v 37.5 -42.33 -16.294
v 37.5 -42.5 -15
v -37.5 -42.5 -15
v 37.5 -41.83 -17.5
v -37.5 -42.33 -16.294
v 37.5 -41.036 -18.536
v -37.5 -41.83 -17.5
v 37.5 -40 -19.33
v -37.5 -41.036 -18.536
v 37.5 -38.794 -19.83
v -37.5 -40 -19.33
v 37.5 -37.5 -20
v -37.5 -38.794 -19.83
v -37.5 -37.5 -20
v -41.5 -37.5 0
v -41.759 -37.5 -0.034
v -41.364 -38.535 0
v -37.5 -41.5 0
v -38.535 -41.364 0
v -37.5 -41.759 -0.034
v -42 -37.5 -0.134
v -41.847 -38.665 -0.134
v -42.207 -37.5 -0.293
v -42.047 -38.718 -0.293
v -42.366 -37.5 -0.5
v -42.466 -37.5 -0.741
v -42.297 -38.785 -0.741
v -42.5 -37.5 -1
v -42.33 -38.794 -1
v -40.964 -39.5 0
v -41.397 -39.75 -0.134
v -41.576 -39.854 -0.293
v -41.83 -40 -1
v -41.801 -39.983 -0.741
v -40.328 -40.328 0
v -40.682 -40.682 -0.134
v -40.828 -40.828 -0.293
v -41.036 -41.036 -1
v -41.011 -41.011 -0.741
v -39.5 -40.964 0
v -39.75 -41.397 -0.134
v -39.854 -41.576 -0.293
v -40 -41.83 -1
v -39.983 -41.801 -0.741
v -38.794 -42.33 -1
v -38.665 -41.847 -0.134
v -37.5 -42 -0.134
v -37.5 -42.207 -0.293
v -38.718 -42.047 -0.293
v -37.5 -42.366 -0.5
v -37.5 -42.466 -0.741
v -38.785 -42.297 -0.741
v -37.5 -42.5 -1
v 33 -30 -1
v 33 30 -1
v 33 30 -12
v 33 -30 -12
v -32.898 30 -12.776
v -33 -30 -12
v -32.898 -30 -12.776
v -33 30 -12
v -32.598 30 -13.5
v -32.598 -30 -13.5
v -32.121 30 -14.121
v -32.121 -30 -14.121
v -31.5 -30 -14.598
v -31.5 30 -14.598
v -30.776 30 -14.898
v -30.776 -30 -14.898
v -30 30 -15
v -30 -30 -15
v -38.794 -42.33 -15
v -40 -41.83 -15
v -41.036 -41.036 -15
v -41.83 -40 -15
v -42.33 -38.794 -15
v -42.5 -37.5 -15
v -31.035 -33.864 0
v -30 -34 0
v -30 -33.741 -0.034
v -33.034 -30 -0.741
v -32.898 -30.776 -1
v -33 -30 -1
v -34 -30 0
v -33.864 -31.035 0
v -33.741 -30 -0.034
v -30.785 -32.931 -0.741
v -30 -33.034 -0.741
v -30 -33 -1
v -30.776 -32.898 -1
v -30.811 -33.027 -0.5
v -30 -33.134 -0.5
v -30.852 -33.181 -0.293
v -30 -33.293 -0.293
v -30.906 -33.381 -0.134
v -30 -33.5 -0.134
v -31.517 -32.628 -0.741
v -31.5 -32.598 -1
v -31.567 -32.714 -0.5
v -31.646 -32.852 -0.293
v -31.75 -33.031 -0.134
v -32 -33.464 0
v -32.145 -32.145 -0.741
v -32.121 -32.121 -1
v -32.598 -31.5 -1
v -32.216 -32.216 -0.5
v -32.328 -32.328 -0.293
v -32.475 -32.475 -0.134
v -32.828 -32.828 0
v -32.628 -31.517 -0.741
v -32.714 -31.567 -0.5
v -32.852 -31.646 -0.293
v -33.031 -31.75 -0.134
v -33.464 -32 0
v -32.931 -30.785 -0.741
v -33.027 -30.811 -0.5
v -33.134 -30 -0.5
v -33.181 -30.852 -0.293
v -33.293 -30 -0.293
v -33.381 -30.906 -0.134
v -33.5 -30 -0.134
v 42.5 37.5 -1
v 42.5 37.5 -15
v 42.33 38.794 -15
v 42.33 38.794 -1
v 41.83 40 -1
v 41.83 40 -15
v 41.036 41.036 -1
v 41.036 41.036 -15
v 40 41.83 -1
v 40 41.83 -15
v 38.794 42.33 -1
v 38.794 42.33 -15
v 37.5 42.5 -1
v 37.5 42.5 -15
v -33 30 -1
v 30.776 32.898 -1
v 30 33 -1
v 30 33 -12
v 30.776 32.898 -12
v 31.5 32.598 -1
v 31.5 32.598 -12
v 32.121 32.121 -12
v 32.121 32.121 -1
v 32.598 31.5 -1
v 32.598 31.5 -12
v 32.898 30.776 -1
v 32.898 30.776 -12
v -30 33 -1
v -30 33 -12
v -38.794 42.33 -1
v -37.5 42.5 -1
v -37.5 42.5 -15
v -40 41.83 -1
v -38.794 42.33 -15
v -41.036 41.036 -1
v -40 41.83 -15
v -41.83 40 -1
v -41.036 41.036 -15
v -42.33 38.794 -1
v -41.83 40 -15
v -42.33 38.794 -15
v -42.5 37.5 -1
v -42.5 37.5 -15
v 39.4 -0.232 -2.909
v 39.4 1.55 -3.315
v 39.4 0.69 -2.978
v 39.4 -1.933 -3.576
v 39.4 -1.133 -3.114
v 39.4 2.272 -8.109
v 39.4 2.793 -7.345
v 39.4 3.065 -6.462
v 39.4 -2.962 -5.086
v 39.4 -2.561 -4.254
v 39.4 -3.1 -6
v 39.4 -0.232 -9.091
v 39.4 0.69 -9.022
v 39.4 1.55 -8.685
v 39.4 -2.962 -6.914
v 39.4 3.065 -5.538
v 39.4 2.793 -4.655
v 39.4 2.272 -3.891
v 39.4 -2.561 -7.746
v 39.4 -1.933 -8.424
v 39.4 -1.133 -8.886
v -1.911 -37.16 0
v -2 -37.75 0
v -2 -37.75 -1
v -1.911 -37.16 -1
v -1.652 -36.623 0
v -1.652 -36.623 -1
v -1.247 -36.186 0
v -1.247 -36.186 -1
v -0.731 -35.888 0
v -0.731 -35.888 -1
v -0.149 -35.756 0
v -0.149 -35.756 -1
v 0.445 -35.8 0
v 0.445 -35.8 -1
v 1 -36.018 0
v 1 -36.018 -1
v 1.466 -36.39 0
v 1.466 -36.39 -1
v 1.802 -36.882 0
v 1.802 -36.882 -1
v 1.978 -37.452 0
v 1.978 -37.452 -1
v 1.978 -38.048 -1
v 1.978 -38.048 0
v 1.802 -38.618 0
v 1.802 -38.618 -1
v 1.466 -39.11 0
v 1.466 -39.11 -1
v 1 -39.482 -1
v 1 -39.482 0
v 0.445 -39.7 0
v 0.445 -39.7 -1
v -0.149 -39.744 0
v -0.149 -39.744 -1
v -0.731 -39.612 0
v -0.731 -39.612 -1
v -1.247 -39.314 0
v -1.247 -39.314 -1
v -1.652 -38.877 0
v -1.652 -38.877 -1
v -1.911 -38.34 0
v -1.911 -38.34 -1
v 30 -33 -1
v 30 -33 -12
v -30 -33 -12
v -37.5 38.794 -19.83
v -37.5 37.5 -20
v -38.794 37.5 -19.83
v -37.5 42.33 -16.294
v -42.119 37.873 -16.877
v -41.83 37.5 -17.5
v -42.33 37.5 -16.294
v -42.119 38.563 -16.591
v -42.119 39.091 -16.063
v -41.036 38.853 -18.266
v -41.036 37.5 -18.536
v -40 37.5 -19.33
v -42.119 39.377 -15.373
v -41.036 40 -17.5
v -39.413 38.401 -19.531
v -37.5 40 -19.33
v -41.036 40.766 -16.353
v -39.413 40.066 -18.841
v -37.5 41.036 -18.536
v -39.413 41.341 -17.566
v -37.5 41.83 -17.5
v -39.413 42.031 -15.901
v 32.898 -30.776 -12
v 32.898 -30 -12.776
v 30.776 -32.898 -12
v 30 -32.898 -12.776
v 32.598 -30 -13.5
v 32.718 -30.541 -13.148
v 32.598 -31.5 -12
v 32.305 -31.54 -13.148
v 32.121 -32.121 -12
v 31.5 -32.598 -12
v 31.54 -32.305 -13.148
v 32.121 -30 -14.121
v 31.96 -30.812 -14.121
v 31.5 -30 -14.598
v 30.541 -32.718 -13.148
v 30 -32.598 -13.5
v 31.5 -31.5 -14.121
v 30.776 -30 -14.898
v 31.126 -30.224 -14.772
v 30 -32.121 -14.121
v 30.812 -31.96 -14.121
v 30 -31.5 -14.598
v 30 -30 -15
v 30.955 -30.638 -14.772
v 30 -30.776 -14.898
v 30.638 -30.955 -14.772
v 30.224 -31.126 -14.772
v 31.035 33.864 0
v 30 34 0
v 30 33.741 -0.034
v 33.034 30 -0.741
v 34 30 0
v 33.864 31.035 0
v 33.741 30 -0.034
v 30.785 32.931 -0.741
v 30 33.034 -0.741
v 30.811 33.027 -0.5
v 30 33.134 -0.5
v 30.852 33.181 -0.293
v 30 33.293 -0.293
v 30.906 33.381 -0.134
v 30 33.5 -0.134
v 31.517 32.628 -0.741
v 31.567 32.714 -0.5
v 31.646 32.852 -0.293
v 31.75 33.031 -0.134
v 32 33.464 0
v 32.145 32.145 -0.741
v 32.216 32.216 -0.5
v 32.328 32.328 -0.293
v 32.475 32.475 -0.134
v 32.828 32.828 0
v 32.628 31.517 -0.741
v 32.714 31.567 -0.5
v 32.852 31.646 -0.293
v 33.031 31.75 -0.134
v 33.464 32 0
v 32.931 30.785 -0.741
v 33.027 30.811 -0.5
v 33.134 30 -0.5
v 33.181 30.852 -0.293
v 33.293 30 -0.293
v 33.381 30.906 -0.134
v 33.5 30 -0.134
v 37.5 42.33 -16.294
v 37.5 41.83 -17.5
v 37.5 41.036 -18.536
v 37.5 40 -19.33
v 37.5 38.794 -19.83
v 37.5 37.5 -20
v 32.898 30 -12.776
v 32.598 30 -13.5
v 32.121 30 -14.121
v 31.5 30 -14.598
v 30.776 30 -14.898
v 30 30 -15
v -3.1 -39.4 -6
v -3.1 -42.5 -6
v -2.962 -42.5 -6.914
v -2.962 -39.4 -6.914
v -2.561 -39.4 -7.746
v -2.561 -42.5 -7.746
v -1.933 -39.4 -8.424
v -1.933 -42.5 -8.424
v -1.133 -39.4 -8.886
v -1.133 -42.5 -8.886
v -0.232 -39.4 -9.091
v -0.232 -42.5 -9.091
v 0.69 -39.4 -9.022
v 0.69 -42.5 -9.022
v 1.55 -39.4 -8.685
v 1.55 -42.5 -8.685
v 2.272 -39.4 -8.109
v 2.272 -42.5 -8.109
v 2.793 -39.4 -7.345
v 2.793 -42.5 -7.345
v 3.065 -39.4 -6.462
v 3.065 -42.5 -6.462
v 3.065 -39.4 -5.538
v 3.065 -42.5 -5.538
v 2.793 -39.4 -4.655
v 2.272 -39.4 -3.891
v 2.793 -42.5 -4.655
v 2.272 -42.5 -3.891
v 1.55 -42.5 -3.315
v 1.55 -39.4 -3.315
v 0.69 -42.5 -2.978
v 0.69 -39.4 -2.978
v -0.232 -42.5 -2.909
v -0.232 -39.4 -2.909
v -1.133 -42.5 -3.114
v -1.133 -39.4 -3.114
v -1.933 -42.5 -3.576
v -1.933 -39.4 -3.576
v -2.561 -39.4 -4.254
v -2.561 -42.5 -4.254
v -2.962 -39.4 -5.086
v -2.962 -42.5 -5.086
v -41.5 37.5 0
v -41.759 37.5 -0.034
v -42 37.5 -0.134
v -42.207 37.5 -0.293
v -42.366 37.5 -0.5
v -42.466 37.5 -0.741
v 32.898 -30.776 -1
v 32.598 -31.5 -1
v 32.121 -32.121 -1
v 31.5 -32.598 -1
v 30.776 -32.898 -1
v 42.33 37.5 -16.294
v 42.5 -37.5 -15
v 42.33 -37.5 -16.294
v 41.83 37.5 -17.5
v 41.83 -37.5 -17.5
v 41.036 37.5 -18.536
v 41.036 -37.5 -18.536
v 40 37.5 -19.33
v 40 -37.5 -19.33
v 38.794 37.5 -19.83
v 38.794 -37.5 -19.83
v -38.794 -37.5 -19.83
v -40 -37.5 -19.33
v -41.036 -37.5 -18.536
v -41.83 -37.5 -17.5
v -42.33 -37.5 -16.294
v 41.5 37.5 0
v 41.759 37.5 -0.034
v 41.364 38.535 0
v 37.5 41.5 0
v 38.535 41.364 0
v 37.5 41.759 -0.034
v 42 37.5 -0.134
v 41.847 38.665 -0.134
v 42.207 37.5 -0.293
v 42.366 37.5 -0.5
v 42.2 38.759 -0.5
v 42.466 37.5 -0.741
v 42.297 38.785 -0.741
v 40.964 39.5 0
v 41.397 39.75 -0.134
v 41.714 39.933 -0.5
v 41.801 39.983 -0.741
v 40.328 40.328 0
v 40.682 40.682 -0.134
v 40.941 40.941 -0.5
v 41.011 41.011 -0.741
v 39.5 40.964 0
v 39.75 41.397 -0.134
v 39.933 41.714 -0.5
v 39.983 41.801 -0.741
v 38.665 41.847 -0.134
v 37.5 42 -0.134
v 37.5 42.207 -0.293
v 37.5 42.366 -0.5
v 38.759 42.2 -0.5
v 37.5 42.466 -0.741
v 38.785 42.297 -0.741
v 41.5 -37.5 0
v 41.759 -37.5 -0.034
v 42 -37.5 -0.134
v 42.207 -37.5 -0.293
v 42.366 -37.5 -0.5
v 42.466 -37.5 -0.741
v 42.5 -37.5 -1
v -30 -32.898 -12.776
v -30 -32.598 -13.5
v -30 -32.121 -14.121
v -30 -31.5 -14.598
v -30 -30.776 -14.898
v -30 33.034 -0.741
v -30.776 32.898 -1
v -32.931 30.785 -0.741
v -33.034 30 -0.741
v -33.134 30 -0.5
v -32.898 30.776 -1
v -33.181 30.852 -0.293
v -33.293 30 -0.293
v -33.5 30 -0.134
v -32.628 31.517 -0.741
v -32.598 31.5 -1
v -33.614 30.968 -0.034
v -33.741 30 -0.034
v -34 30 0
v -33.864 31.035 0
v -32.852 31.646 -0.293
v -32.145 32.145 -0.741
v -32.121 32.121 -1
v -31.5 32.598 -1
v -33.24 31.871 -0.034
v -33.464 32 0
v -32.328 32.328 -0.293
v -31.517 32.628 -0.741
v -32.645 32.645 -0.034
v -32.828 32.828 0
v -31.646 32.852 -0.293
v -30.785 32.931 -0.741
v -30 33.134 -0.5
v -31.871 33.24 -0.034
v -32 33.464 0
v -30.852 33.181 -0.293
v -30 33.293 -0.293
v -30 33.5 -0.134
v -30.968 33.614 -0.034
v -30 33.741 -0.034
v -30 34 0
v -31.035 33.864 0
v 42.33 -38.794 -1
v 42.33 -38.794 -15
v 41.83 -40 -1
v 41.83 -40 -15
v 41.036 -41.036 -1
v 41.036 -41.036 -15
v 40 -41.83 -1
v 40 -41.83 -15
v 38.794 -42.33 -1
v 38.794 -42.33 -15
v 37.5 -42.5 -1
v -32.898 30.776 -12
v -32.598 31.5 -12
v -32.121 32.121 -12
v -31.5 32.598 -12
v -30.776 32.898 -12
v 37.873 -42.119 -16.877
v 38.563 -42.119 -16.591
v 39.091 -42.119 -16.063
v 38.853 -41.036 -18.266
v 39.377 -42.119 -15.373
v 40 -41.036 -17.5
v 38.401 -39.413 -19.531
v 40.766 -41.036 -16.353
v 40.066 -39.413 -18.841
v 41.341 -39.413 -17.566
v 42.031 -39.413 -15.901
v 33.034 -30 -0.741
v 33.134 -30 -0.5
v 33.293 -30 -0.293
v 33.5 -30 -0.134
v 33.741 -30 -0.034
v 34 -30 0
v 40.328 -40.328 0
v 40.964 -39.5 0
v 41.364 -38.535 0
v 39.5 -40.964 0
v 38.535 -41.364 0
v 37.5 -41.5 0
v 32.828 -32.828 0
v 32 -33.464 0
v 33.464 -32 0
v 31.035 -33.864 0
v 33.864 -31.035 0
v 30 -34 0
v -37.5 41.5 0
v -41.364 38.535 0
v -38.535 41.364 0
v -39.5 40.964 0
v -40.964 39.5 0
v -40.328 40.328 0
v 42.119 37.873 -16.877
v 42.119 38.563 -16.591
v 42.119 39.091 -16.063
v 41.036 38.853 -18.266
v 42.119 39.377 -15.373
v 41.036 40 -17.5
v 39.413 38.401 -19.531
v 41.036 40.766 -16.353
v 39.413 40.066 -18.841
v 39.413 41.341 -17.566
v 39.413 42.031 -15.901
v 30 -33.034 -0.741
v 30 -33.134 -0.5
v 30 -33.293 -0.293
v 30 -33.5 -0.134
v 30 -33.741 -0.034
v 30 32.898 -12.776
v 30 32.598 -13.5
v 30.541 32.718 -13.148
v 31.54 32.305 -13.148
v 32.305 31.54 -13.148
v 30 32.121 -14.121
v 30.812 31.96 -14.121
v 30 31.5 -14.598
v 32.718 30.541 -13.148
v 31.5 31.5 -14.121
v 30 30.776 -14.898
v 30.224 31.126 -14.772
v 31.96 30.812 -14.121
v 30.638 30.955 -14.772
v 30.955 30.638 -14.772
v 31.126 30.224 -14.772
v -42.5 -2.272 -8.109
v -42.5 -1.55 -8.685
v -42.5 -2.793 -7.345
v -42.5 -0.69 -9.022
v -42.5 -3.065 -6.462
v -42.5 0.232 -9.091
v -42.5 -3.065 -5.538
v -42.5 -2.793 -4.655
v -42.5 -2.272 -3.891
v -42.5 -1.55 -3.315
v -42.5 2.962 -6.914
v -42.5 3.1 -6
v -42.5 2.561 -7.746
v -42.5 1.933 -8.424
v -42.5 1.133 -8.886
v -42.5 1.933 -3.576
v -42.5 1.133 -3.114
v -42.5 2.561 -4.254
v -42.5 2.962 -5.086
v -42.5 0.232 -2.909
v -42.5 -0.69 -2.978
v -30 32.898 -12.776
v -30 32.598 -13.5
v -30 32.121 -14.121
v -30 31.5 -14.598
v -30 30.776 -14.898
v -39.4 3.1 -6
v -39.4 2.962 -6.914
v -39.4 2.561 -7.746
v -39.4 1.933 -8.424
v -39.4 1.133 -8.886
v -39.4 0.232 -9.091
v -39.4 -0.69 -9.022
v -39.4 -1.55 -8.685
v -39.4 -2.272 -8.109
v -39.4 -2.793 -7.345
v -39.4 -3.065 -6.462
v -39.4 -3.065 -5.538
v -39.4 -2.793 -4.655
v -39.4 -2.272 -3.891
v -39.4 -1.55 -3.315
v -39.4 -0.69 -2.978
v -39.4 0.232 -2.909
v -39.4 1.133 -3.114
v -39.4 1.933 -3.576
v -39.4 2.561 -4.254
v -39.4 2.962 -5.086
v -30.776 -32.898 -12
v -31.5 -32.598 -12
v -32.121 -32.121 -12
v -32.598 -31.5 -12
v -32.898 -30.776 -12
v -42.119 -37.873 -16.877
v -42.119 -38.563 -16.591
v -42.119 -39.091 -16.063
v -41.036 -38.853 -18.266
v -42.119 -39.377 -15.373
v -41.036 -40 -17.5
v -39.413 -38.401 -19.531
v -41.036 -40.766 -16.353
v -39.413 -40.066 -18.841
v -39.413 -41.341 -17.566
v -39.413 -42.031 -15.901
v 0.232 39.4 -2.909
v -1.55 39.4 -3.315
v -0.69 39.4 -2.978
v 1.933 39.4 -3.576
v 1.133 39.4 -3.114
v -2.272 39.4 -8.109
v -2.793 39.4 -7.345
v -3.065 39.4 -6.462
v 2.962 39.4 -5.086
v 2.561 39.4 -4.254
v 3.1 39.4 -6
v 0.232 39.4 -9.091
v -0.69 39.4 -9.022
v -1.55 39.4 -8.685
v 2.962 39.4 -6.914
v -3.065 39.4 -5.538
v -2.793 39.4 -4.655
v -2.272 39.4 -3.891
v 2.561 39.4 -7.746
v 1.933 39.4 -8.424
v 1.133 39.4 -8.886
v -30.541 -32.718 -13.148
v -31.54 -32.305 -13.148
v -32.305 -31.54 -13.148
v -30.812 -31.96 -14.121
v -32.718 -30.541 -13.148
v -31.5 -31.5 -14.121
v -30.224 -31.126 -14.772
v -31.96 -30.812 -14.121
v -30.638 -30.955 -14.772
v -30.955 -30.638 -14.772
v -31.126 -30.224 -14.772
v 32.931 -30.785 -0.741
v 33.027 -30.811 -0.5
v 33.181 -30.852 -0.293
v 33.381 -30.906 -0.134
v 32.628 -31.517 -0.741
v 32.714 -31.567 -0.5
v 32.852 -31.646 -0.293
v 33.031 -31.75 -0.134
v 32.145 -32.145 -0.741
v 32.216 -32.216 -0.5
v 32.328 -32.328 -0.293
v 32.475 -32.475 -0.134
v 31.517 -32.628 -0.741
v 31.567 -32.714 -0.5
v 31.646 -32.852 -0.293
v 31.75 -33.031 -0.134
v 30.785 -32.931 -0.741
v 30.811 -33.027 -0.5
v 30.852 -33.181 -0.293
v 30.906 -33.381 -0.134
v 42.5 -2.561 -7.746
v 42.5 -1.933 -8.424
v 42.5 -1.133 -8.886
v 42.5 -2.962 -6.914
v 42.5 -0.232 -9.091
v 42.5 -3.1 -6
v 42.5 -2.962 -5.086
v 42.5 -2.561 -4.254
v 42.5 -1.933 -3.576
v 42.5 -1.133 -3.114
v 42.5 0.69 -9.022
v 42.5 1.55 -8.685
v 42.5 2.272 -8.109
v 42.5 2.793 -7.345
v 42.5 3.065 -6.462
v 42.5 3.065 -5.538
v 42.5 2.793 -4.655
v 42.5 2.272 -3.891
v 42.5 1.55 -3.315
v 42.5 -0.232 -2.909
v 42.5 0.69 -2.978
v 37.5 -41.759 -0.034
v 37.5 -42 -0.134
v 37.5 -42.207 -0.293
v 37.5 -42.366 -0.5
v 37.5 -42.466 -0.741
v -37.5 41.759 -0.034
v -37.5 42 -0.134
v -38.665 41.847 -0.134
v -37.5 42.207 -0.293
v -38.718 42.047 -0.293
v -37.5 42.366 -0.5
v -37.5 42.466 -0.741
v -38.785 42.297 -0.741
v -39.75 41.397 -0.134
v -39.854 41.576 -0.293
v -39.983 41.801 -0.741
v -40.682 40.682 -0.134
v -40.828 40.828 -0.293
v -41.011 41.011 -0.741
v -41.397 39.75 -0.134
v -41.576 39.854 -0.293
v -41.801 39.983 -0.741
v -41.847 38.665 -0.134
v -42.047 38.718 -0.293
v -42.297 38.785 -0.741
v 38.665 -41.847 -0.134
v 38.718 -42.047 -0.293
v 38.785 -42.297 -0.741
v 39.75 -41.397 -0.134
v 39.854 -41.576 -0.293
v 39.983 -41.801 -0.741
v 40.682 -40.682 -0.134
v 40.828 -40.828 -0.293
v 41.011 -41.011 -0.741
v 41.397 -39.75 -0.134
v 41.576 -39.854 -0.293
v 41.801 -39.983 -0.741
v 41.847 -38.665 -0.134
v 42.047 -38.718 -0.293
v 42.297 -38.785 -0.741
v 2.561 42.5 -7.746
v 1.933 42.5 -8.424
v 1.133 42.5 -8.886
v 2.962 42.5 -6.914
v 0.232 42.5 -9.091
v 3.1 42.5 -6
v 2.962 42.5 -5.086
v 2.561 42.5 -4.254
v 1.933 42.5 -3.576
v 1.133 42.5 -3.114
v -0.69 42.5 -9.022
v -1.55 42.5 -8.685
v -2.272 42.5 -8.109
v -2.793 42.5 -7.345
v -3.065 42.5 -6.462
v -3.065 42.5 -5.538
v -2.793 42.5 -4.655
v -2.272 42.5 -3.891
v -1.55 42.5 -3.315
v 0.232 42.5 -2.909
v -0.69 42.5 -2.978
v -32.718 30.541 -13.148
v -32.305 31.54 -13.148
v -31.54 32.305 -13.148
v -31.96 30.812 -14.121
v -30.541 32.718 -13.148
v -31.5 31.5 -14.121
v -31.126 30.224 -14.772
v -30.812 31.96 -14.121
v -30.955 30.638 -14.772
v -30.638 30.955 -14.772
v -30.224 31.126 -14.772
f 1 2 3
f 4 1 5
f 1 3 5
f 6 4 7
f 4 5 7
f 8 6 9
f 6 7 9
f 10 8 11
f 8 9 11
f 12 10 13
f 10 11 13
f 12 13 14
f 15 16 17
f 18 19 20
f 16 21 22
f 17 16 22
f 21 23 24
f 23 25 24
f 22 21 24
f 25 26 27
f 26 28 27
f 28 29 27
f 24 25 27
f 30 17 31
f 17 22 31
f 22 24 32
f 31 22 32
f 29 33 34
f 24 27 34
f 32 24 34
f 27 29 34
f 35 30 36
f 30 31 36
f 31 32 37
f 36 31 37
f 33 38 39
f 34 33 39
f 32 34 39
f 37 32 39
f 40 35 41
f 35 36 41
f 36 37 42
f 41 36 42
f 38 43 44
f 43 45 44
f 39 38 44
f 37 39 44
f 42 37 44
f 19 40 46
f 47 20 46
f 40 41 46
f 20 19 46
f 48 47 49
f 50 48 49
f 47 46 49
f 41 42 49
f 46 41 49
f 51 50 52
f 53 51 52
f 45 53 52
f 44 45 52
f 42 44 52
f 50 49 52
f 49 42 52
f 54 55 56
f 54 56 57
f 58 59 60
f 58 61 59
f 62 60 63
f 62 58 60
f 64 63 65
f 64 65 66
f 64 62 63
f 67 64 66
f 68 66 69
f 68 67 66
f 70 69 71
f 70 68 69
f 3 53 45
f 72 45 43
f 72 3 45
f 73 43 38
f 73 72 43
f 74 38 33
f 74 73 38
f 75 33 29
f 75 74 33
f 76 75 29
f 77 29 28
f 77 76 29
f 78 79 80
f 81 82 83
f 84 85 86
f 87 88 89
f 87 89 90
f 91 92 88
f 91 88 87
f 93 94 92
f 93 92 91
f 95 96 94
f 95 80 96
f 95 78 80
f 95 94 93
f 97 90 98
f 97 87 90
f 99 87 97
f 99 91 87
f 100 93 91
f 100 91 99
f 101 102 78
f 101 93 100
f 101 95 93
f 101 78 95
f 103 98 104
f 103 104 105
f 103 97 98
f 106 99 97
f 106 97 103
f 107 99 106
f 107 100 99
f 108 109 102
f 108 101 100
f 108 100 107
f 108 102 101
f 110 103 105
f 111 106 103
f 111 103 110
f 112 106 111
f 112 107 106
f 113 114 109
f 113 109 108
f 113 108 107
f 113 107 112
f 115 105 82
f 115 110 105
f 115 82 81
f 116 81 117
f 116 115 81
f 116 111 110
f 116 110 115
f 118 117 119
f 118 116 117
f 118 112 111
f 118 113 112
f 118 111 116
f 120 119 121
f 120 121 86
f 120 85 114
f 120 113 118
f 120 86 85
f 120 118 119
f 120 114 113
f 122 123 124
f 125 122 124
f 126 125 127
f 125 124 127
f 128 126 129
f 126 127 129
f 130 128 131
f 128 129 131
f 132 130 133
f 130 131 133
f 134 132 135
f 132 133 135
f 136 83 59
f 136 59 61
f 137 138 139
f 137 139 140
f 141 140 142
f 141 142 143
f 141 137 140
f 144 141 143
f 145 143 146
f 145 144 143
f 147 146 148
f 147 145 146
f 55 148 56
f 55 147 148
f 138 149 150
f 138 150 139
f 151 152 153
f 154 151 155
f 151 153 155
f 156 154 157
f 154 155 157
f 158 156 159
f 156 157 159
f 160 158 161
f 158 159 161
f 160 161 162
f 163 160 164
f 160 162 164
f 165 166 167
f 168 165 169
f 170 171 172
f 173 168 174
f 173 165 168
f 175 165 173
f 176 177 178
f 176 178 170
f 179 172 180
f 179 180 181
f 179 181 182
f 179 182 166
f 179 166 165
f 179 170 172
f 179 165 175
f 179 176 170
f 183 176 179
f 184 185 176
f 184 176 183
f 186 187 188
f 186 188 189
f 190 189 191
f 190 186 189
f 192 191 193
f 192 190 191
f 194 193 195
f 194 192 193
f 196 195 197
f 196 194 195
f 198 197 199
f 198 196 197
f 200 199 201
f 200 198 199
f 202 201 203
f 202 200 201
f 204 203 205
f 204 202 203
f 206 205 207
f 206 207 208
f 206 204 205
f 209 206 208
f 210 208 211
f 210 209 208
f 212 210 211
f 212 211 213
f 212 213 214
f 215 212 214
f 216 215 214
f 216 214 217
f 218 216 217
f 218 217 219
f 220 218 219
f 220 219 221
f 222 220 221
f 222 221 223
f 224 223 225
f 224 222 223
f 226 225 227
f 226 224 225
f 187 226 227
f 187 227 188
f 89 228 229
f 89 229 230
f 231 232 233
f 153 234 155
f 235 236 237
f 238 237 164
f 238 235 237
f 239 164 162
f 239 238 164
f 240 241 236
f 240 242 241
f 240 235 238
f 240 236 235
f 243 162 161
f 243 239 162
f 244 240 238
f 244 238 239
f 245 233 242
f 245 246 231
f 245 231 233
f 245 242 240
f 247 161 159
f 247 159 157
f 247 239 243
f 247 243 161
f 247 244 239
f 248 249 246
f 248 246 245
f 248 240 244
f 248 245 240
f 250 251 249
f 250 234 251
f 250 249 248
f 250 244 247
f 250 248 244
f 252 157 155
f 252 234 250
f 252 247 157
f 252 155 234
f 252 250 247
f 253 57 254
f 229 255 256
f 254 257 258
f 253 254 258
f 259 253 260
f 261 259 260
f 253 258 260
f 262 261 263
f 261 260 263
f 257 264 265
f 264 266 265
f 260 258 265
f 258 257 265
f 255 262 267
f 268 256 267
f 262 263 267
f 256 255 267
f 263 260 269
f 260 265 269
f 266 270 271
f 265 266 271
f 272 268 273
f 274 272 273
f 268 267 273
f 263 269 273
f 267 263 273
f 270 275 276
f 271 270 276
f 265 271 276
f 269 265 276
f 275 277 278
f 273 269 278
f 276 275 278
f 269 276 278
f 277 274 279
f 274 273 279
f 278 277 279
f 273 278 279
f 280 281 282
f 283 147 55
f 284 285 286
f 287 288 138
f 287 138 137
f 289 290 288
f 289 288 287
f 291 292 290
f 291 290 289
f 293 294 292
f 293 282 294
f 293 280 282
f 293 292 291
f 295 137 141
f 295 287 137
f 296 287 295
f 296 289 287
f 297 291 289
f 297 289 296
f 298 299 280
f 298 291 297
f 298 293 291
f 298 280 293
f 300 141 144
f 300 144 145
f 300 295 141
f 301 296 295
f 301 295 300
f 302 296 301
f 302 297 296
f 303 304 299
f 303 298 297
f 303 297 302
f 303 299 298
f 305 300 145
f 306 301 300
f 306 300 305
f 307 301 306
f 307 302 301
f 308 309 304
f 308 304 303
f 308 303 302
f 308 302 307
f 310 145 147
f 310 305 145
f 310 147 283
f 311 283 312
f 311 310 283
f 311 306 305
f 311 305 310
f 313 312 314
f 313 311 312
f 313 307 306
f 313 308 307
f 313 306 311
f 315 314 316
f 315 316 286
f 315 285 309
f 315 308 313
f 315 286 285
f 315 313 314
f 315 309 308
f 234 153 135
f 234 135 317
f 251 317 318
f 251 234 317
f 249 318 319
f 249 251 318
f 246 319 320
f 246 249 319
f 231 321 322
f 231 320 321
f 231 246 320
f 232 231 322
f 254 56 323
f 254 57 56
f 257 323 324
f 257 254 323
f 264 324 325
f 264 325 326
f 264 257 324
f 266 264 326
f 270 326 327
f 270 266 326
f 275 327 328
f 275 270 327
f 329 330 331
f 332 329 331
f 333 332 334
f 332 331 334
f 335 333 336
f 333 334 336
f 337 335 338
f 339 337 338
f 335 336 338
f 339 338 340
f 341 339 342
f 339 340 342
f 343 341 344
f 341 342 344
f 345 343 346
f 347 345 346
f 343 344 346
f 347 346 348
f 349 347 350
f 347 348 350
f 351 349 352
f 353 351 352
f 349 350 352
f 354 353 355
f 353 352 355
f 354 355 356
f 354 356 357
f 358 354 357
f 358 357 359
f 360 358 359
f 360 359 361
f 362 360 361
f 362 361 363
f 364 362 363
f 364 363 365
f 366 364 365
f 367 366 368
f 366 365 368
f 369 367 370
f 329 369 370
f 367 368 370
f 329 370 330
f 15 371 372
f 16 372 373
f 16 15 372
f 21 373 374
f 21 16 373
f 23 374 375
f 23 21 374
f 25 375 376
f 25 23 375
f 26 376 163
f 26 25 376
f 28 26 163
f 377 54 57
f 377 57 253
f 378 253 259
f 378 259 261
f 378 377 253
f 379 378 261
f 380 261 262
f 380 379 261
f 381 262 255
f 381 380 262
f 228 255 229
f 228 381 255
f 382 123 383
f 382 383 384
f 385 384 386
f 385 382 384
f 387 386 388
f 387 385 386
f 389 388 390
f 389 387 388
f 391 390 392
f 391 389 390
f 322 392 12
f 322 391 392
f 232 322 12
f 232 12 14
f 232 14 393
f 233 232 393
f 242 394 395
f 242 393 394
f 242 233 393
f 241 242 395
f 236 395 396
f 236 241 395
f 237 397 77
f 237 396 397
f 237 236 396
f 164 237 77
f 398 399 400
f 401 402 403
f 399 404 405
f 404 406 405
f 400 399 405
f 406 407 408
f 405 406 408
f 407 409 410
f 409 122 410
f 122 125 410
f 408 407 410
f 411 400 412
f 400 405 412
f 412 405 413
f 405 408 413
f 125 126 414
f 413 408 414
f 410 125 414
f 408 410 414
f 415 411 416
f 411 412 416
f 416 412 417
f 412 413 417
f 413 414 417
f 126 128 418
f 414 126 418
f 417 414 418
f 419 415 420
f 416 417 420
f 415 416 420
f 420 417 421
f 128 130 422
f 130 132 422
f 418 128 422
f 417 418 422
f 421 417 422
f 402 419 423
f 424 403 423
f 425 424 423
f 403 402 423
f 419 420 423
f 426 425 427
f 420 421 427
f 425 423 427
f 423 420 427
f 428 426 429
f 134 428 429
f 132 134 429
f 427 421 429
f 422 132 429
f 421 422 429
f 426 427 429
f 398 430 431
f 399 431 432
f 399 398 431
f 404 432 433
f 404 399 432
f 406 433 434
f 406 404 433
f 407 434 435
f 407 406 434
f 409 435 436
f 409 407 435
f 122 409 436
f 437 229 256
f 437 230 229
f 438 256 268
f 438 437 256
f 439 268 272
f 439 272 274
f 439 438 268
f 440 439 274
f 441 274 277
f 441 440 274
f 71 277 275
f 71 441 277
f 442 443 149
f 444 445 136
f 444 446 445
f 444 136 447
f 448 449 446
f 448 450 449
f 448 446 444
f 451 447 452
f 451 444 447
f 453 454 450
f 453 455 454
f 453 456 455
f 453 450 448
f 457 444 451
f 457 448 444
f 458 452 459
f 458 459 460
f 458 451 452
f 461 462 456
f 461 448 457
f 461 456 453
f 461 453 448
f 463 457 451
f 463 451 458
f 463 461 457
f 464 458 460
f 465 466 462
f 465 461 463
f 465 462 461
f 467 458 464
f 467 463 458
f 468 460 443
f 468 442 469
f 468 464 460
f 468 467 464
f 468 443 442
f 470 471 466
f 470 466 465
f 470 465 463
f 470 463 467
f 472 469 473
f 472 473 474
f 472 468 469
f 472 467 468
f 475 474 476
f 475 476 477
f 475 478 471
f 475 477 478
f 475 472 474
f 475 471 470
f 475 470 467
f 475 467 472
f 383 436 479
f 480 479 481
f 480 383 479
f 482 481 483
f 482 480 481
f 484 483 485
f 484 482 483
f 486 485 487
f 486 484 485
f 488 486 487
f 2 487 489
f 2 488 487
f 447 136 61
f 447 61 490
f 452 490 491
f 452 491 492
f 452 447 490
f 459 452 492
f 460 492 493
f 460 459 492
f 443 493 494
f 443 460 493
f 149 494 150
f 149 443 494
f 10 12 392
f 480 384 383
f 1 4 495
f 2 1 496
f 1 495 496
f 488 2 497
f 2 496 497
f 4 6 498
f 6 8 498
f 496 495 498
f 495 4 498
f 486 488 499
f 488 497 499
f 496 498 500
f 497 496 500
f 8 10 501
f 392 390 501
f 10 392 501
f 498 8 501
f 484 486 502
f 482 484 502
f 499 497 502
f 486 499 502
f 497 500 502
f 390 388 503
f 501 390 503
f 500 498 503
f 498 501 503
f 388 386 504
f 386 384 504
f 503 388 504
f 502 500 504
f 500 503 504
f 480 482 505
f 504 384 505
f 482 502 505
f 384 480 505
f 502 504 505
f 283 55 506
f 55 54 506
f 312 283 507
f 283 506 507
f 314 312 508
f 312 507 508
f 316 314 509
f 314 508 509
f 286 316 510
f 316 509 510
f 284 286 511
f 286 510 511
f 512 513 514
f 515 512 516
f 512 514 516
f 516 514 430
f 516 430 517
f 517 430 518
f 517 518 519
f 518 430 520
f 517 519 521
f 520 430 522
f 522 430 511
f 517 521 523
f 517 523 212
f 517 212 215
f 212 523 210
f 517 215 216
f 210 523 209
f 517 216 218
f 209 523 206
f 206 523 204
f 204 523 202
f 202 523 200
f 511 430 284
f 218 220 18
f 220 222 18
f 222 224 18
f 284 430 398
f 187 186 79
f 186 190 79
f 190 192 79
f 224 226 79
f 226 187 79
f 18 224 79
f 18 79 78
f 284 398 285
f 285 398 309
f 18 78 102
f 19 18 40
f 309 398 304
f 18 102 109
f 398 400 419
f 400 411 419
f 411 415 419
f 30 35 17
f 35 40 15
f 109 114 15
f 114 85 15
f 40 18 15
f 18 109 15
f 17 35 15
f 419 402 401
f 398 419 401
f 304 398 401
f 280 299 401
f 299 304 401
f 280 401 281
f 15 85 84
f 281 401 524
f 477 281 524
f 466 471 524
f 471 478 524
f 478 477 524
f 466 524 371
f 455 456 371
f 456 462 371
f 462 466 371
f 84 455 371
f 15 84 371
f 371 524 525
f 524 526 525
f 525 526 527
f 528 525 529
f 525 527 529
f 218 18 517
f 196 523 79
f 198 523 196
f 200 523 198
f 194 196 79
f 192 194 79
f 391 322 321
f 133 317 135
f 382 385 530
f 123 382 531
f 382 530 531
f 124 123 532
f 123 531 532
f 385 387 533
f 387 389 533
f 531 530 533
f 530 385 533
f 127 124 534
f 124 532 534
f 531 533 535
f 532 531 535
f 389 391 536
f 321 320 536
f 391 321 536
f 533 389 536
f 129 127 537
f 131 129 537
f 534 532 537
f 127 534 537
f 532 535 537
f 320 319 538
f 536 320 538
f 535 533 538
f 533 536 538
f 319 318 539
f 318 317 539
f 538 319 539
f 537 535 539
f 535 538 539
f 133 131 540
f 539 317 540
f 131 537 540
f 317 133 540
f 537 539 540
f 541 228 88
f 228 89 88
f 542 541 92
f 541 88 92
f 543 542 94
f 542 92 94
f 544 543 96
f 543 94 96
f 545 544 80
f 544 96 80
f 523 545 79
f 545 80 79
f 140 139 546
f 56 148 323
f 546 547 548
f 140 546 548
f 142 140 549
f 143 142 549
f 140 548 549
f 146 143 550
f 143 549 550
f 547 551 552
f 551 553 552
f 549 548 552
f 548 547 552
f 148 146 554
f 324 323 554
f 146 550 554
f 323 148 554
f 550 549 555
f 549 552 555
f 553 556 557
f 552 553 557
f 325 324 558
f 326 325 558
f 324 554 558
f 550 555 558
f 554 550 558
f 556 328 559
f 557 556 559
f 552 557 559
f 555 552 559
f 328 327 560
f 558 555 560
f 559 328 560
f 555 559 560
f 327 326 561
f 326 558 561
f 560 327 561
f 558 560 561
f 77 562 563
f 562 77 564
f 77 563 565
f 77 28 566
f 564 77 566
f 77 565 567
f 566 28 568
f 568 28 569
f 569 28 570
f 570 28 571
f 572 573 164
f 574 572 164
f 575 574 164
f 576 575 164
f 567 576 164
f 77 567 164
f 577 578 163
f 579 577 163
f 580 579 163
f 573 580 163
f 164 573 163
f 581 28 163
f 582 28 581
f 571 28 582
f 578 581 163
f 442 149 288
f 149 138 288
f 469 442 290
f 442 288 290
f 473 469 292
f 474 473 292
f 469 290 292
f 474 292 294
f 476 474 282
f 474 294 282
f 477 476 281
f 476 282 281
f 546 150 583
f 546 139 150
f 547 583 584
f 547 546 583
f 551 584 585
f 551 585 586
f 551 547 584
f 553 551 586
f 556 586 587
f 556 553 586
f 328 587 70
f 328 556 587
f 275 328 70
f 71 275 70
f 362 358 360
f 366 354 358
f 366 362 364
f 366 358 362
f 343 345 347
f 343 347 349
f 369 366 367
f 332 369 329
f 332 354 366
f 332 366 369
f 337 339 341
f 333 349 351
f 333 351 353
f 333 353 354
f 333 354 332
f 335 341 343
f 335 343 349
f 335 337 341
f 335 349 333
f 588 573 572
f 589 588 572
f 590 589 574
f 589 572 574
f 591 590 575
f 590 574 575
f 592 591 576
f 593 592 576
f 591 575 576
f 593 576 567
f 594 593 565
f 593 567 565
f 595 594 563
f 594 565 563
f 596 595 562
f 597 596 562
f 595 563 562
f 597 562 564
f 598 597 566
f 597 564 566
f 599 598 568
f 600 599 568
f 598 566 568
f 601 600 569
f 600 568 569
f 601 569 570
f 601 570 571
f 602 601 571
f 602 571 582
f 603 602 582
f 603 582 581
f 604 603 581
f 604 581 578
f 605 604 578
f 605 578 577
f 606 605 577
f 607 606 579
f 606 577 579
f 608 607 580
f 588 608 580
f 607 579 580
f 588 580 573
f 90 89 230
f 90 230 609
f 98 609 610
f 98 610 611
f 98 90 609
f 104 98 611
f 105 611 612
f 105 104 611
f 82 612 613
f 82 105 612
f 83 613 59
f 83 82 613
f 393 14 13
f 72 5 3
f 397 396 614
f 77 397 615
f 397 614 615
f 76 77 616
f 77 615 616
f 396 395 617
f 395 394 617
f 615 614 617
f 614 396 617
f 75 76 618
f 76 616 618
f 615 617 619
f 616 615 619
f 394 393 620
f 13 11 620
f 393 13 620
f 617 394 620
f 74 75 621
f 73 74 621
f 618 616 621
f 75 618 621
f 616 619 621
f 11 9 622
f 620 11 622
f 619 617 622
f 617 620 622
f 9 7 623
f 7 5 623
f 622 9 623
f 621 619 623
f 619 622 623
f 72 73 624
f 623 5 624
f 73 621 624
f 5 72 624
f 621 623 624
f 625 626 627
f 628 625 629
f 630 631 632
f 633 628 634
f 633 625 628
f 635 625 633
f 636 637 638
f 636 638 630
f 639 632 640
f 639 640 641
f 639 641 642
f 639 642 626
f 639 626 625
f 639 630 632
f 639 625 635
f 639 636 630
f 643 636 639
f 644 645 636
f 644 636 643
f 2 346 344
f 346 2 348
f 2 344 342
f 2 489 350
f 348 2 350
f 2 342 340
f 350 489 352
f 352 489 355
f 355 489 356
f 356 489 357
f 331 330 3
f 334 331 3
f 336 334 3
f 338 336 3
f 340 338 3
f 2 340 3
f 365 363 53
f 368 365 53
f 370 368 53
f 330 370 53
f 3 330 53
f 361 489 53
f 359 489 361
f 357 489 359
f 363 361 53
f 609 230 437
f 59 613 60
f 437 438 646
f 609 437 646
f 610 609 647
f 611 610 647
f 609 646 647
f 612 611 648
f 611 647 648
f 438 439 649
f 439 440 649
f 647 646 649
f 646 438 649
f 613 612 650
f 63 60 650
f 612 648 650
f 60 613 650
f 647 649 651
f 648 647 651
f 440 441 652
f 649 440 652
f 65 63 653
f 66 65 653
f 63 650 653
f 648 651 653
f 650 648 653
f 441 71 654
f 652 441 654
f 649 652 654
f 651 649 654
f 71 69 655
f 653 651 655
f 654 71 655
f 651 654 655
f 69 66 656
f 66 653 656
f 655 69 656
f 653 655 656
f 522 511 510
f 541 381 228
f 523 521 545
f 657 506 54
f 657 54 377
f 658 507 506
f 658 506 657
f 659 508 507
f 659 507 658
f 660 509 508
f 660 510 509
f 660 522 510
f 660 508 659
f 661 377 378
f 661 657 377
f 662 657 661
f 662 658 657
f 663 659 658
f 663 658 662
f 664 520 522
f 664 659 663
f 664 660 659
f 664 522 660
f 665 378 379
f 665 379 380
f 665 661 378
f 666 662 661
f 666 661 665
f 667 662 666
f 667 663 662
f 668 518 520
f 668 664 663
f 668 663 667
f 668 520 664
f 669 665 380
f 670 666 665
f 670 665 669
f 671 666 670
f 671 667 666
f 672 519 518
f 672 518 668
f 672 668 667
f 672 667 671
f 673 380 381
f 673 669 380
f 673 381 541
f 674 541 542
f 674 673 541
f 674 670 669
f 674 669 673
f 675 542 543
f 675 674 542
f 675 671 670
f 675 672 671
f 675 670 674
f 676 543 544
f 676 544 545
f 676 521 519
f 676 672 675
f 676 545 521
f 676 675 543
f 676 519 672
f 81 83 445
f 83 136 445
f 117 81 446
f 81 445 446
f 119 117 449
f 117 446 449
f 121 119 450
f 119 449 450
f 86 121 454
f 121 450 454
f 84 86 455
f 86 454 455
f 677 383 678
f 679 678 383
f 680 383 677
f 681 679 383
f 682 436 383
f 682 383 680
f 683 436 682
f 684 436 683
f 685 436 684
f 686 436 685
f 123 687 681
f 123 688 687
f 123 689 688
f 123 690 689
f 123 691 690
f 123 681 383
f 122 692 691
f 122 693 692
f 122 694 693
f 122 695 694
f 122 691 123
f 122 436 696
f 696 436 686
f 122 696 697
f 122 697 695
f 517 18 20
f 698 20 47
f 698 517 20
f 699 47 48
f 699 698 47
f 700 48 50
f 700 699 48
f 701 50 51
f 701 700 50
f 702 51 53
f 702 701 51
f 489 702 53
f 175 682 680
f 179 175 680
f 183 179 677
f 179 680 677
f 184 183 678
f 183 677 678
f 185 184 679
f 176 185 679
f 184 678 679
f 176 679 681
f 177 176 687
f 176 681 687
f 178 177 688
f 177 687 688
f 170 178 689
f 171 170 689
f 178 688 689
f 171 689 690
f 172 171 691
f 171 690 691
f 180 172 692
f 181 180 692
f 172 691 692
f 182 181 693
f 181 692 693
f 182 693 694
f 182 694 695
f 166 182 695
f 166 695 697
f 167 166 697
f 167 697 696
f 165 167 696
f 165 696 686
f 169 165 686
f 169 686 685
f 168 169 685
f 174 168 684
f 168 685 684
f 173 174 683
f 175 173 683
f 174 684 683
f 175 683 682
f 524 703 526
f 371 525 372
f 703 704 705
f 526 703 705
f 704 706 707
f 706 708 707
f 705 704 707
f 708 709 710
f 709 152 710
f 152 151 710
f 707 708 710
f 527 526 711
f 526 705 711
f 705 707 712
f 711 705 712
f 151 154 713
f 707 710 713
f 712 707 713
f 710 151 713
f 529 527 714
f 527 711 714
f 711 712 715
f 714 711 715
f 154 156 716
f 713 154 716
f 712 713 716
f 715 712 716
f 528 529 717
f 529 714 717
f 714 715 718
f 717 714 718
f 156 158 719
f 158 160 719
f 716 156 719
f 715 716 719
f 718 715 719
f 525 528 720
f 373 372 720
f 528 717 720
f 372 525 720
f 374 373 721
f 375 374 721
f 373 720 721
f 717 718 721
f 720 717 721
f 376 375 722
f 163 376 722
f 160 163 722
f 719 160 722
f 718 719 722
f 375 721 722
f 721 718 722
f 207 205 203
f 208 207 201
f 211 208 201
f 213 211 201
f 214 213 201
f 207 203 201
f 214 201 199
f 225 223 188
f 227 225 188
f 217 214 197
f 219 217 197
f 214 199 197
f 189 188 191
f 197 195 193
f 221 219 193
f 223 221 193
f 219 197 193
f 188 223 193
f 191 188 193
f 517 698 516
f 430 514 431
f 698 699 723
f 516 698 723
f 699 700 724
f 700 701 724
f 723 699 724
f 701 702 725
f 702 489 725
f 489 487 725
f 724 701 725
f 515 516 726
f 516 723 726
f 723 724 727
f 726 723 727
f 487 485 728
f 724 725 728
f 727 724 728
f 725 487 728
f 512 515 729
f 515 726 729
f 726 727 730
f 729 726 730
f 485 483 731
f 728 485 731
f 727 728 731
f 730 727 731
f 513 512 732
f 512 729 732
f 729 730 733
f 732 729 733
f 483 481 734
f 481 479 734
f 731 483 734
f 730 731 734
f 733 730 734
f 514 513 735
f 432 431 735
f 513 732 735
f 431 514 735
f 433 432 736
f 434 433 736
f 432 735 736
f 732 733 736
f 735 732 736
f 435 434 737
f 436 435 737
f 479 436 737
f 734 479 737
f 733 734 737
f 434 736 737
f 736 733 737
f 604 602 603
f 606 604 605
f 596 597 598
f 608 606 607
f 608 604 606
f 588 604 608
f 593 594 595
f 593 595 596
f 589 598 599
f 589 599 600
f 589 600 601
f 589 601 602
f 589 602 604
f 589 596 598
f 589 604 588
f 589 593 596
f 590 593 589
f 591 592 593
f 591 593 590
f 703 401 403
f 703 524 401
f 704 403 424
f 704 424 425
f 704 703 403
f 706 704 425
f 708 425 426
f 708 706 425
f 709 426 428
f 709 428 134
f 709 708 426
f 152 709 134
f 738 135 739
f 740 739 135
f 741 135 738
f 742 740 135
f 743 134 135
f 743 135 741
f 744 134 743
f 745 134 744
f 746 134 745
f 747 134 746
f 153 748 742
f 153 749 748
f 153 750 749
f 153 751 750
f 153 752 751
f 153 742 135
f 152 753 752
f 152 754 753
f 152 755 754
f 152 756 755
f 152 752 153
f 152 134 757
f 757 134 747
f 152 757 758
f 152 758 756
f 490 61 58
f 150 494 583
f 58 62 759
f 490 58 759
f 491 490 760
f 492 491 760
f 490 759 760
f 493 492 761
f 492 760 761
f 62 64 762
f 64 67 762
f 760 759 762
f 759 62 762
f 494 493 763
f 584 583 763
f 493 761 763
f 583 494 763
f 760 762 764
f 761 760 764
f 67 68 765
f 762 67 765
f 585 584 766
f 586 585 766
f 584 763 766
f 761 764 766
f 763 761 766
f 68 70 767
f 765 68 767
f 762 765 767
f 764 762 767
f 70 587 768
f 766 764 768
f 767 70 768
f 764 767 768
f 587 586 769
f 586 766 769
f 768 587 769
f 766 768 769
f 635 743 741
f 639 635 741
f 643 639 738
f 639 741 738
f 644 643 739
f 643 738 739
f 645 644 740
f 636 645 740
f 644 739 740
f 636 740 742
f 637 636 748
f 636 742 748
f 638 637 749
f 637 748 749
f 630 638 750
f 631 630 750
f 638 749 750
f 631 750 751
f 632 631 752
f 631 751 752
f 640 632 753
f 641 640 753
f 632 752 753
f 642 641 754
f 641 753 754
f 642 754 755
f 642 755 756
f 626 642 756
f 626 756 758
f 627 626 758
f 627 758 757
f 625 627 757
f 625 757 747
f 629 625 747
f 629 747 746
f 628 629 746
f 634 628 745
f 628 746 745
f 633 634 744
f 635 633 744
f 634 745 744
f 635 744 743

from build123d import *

# Parameters (mm, degrees)
F0_W      = 85
F0_H      = 85
F0_R      = 2
F1_DEPTH  = 20
F2_DEPTH  = 15
F3_R      = 5
F4_R      = 3
F5_R      = 1
F6_R      = 3.1
F7_DEPTH  = 3.1
F8_R      = 3.1
F9_DEPTH  = 3.1
F10_R     = 3.1
F11_DEPTH = 3.1
F12_R     = 3.1
F13_DEPTH = 3.1
F14_DEPTH = 1
F15_ANGLE = 180


# Not quite as in the source:
# - a feature names something its author has since deleted; it is built from what else it names


with BuildPart() as f1:
    # F0 (on Top) → F1 (new body)
    with BuildSketch(Plane.XY):
        Rectangle(F0_W, F0_H)
        with Locations((0, -37.75)):
            Circle(F0_R, mode=Mode.SUBTRACT)
        with BuildLine():
            ThreePointArc((-33, 30), (-32.1213203436, 32.1213203436), (-30, 33))
            Line((-30, 33), (30, 33))
            ThreePointArc((30, 33), (32.1213203436, 32.1213203436), (33, 30))
            Line((33, 30), (33, -30))
            ThreePointArc((33, -30), (32.1213203436, -32.1213203436), (30, -33))
            Line((30, -33), (-30, -33))
            ThreePointArc((-30, -33), (-32.1213203436, -32.1213203436), (-33, -30))
            Line((-33, -30), (-33, 30))
        make_face(mode=Mode.SUBTRACT)
        with BuildLine():
            Line((30, 33), (-30, 33))
            ThreePointArc((-30, 33), (-32.1213203436, 32.1213203436), (-33, 30))
            Line((-33, 30), (-33, -30))
            ThreePointArc((-33, -30), (-32.1213203436, -32.1213203436), (-30, -33))
            Line((-30, -33), (30, -33))
            ThreePointArc((30, -33), (32.1213203436, -32.1213203436), (33, -30))
            Line((33, -30), (33, 30))
            ThreePointArc((33, 30), (32.1213203436, 32.1213203436), (30, 33))
        make_face()
        with Locations((0, -37.75)):
            Circle(F0_R)
    extrude(amount=F1_DEPTH)

    # F0 (on Top) → F2 (cut)
    with BuildSketch(Plane.XY):
        with BuildLine():
            Line((30, 33), (-30, 33))
            ThreePointArc((-30, 33), (-32.1213203436, 32.1213203436), (-33, 30))
            Line((-33, 30), (-33, -30))
            ThreePointArc((-33, -30), (-32.1213203436, -32.1213203436), (-30, -33))
            Line((-30, -33), (30, -33))
            ThreePointArc((30, -33), (32.1213203436, -32.1213203436), (33, -30))
            Line((33, -30), (33, 30))
            ThreePointArc((33, 30), (32.1213203436, 32.1213203436), (30, 33))
        make_face()
    extrude(amount=F2_DEPTH, mode=Mode.SUBTRACT)

    # F3
    f3_edges = [f1.edges().sort_by_distance(p)[0] for p in [
        (0, 42.5, 20),
        (-42.5, 0, 20),
        (0, -42.5, 20),
        (42.5, 0, 20),
        (42.5, 42.5, 10),
        (-42.5, 42.5, 10),
        (-42.5, -42.5, 10),
        (42.5, -42.5, 10),
    ]]
    fillet(f3_edges, radius=F3_R)

    # F4
    f4_edges = [f1.edges().sort_by_distance(p)[0] for p in [
        (0, 33, 15),
        (-32.12132, 32.12132, 15),
        (-33, 0, 15),
        (-32.12132, -32.12132, 15),
        (0, -33, 15),
        (32.12132, -32.12132, 15),
        (33, 0, 15),
        (32.12132, 32.12132, 15),
    ]]
    fillet(f4_edges, radius=F4_R)

    # F5
    f5_edges = [f1.edges().sort_by_distance(p)[0] for p in [
        (0, 42.5, 0),
        (41.035534, 41.035534, 0),
        (-41.035534, 41.035534, 0),
        (42.5, 0, 0),
        (-42.5, 0, 0),
        (41.035534, -41.035534, 0),
        (-41.035534, -41.035534, 0),
        (0, -42.5, 0),
        (0, 33, 0),
        (-32.12132, 32.12132, 0),
        (-33, 0, 0),
        (-32.12132, -32.12132, 0),
        (0, -33, 0),
        (32.12132, -32.12132, 0),
        (33, 0, 0),
        (32.12132, 32.12132, 0),
    ]]
    fillet(f5_edges, radius=F5_R)

    # F6 (on face) → F7 (cut)
    with BuildSketch(Plane.XZ.offset(42.5)):
        with Locations((0, 6)):
            Circle(F6_R)
    extrude(amount=-F7_DEPTH, mode=Mode.SUBTRACT)

    # F8 (on face) → F9 (cut)
    with BuildSketch(Plane(origin=(0, 42.5, 0), x_dir=(-1, 0, 0), z_dir=(0, 1, 0))):
        with Locations((0, 6)):
            Circle(F8_R)
    extrude(amount=-F9_DEPTH, mode=Mode.SUBTRACT)

    # F10 (on face) → F11 (cut)
    with BuildSketch(Plane(origin=(-42.5, 0, 0), x_dir=(0, -1, 0), z_dir=(-1, 0, 0))):
        with Locations((0, 6)):
            Circle(F10_R)
    extrude(amount=-F11_DEPTH, mode=Mode.SUBTRACT)

    # F12 (on face) → F13 (cut)
    with BuildSketch(Plane.YZ.offset(42.5)):
        with Locations((0, 6)):
            Circle(F12_R)
    extrude(amount=-F13_DEPTH, mode=Mode.SUBTRACT)

    # F0 (on Top) → F14 (cut)
    with BuildSketch(Plane.XY):
        with Locations((0, -37.75)):
            Circle(F0_R)
    extrude(amount=F14_DEPTH, mode=Mode.SUBTRACT)


with BuildPart() as f1_1:
    # F15: moved
    add(f1.part.rotate(Axis((0, 0, 0), (0, 1, 0)), F15_ANGLE))


solid = f1_1.part
